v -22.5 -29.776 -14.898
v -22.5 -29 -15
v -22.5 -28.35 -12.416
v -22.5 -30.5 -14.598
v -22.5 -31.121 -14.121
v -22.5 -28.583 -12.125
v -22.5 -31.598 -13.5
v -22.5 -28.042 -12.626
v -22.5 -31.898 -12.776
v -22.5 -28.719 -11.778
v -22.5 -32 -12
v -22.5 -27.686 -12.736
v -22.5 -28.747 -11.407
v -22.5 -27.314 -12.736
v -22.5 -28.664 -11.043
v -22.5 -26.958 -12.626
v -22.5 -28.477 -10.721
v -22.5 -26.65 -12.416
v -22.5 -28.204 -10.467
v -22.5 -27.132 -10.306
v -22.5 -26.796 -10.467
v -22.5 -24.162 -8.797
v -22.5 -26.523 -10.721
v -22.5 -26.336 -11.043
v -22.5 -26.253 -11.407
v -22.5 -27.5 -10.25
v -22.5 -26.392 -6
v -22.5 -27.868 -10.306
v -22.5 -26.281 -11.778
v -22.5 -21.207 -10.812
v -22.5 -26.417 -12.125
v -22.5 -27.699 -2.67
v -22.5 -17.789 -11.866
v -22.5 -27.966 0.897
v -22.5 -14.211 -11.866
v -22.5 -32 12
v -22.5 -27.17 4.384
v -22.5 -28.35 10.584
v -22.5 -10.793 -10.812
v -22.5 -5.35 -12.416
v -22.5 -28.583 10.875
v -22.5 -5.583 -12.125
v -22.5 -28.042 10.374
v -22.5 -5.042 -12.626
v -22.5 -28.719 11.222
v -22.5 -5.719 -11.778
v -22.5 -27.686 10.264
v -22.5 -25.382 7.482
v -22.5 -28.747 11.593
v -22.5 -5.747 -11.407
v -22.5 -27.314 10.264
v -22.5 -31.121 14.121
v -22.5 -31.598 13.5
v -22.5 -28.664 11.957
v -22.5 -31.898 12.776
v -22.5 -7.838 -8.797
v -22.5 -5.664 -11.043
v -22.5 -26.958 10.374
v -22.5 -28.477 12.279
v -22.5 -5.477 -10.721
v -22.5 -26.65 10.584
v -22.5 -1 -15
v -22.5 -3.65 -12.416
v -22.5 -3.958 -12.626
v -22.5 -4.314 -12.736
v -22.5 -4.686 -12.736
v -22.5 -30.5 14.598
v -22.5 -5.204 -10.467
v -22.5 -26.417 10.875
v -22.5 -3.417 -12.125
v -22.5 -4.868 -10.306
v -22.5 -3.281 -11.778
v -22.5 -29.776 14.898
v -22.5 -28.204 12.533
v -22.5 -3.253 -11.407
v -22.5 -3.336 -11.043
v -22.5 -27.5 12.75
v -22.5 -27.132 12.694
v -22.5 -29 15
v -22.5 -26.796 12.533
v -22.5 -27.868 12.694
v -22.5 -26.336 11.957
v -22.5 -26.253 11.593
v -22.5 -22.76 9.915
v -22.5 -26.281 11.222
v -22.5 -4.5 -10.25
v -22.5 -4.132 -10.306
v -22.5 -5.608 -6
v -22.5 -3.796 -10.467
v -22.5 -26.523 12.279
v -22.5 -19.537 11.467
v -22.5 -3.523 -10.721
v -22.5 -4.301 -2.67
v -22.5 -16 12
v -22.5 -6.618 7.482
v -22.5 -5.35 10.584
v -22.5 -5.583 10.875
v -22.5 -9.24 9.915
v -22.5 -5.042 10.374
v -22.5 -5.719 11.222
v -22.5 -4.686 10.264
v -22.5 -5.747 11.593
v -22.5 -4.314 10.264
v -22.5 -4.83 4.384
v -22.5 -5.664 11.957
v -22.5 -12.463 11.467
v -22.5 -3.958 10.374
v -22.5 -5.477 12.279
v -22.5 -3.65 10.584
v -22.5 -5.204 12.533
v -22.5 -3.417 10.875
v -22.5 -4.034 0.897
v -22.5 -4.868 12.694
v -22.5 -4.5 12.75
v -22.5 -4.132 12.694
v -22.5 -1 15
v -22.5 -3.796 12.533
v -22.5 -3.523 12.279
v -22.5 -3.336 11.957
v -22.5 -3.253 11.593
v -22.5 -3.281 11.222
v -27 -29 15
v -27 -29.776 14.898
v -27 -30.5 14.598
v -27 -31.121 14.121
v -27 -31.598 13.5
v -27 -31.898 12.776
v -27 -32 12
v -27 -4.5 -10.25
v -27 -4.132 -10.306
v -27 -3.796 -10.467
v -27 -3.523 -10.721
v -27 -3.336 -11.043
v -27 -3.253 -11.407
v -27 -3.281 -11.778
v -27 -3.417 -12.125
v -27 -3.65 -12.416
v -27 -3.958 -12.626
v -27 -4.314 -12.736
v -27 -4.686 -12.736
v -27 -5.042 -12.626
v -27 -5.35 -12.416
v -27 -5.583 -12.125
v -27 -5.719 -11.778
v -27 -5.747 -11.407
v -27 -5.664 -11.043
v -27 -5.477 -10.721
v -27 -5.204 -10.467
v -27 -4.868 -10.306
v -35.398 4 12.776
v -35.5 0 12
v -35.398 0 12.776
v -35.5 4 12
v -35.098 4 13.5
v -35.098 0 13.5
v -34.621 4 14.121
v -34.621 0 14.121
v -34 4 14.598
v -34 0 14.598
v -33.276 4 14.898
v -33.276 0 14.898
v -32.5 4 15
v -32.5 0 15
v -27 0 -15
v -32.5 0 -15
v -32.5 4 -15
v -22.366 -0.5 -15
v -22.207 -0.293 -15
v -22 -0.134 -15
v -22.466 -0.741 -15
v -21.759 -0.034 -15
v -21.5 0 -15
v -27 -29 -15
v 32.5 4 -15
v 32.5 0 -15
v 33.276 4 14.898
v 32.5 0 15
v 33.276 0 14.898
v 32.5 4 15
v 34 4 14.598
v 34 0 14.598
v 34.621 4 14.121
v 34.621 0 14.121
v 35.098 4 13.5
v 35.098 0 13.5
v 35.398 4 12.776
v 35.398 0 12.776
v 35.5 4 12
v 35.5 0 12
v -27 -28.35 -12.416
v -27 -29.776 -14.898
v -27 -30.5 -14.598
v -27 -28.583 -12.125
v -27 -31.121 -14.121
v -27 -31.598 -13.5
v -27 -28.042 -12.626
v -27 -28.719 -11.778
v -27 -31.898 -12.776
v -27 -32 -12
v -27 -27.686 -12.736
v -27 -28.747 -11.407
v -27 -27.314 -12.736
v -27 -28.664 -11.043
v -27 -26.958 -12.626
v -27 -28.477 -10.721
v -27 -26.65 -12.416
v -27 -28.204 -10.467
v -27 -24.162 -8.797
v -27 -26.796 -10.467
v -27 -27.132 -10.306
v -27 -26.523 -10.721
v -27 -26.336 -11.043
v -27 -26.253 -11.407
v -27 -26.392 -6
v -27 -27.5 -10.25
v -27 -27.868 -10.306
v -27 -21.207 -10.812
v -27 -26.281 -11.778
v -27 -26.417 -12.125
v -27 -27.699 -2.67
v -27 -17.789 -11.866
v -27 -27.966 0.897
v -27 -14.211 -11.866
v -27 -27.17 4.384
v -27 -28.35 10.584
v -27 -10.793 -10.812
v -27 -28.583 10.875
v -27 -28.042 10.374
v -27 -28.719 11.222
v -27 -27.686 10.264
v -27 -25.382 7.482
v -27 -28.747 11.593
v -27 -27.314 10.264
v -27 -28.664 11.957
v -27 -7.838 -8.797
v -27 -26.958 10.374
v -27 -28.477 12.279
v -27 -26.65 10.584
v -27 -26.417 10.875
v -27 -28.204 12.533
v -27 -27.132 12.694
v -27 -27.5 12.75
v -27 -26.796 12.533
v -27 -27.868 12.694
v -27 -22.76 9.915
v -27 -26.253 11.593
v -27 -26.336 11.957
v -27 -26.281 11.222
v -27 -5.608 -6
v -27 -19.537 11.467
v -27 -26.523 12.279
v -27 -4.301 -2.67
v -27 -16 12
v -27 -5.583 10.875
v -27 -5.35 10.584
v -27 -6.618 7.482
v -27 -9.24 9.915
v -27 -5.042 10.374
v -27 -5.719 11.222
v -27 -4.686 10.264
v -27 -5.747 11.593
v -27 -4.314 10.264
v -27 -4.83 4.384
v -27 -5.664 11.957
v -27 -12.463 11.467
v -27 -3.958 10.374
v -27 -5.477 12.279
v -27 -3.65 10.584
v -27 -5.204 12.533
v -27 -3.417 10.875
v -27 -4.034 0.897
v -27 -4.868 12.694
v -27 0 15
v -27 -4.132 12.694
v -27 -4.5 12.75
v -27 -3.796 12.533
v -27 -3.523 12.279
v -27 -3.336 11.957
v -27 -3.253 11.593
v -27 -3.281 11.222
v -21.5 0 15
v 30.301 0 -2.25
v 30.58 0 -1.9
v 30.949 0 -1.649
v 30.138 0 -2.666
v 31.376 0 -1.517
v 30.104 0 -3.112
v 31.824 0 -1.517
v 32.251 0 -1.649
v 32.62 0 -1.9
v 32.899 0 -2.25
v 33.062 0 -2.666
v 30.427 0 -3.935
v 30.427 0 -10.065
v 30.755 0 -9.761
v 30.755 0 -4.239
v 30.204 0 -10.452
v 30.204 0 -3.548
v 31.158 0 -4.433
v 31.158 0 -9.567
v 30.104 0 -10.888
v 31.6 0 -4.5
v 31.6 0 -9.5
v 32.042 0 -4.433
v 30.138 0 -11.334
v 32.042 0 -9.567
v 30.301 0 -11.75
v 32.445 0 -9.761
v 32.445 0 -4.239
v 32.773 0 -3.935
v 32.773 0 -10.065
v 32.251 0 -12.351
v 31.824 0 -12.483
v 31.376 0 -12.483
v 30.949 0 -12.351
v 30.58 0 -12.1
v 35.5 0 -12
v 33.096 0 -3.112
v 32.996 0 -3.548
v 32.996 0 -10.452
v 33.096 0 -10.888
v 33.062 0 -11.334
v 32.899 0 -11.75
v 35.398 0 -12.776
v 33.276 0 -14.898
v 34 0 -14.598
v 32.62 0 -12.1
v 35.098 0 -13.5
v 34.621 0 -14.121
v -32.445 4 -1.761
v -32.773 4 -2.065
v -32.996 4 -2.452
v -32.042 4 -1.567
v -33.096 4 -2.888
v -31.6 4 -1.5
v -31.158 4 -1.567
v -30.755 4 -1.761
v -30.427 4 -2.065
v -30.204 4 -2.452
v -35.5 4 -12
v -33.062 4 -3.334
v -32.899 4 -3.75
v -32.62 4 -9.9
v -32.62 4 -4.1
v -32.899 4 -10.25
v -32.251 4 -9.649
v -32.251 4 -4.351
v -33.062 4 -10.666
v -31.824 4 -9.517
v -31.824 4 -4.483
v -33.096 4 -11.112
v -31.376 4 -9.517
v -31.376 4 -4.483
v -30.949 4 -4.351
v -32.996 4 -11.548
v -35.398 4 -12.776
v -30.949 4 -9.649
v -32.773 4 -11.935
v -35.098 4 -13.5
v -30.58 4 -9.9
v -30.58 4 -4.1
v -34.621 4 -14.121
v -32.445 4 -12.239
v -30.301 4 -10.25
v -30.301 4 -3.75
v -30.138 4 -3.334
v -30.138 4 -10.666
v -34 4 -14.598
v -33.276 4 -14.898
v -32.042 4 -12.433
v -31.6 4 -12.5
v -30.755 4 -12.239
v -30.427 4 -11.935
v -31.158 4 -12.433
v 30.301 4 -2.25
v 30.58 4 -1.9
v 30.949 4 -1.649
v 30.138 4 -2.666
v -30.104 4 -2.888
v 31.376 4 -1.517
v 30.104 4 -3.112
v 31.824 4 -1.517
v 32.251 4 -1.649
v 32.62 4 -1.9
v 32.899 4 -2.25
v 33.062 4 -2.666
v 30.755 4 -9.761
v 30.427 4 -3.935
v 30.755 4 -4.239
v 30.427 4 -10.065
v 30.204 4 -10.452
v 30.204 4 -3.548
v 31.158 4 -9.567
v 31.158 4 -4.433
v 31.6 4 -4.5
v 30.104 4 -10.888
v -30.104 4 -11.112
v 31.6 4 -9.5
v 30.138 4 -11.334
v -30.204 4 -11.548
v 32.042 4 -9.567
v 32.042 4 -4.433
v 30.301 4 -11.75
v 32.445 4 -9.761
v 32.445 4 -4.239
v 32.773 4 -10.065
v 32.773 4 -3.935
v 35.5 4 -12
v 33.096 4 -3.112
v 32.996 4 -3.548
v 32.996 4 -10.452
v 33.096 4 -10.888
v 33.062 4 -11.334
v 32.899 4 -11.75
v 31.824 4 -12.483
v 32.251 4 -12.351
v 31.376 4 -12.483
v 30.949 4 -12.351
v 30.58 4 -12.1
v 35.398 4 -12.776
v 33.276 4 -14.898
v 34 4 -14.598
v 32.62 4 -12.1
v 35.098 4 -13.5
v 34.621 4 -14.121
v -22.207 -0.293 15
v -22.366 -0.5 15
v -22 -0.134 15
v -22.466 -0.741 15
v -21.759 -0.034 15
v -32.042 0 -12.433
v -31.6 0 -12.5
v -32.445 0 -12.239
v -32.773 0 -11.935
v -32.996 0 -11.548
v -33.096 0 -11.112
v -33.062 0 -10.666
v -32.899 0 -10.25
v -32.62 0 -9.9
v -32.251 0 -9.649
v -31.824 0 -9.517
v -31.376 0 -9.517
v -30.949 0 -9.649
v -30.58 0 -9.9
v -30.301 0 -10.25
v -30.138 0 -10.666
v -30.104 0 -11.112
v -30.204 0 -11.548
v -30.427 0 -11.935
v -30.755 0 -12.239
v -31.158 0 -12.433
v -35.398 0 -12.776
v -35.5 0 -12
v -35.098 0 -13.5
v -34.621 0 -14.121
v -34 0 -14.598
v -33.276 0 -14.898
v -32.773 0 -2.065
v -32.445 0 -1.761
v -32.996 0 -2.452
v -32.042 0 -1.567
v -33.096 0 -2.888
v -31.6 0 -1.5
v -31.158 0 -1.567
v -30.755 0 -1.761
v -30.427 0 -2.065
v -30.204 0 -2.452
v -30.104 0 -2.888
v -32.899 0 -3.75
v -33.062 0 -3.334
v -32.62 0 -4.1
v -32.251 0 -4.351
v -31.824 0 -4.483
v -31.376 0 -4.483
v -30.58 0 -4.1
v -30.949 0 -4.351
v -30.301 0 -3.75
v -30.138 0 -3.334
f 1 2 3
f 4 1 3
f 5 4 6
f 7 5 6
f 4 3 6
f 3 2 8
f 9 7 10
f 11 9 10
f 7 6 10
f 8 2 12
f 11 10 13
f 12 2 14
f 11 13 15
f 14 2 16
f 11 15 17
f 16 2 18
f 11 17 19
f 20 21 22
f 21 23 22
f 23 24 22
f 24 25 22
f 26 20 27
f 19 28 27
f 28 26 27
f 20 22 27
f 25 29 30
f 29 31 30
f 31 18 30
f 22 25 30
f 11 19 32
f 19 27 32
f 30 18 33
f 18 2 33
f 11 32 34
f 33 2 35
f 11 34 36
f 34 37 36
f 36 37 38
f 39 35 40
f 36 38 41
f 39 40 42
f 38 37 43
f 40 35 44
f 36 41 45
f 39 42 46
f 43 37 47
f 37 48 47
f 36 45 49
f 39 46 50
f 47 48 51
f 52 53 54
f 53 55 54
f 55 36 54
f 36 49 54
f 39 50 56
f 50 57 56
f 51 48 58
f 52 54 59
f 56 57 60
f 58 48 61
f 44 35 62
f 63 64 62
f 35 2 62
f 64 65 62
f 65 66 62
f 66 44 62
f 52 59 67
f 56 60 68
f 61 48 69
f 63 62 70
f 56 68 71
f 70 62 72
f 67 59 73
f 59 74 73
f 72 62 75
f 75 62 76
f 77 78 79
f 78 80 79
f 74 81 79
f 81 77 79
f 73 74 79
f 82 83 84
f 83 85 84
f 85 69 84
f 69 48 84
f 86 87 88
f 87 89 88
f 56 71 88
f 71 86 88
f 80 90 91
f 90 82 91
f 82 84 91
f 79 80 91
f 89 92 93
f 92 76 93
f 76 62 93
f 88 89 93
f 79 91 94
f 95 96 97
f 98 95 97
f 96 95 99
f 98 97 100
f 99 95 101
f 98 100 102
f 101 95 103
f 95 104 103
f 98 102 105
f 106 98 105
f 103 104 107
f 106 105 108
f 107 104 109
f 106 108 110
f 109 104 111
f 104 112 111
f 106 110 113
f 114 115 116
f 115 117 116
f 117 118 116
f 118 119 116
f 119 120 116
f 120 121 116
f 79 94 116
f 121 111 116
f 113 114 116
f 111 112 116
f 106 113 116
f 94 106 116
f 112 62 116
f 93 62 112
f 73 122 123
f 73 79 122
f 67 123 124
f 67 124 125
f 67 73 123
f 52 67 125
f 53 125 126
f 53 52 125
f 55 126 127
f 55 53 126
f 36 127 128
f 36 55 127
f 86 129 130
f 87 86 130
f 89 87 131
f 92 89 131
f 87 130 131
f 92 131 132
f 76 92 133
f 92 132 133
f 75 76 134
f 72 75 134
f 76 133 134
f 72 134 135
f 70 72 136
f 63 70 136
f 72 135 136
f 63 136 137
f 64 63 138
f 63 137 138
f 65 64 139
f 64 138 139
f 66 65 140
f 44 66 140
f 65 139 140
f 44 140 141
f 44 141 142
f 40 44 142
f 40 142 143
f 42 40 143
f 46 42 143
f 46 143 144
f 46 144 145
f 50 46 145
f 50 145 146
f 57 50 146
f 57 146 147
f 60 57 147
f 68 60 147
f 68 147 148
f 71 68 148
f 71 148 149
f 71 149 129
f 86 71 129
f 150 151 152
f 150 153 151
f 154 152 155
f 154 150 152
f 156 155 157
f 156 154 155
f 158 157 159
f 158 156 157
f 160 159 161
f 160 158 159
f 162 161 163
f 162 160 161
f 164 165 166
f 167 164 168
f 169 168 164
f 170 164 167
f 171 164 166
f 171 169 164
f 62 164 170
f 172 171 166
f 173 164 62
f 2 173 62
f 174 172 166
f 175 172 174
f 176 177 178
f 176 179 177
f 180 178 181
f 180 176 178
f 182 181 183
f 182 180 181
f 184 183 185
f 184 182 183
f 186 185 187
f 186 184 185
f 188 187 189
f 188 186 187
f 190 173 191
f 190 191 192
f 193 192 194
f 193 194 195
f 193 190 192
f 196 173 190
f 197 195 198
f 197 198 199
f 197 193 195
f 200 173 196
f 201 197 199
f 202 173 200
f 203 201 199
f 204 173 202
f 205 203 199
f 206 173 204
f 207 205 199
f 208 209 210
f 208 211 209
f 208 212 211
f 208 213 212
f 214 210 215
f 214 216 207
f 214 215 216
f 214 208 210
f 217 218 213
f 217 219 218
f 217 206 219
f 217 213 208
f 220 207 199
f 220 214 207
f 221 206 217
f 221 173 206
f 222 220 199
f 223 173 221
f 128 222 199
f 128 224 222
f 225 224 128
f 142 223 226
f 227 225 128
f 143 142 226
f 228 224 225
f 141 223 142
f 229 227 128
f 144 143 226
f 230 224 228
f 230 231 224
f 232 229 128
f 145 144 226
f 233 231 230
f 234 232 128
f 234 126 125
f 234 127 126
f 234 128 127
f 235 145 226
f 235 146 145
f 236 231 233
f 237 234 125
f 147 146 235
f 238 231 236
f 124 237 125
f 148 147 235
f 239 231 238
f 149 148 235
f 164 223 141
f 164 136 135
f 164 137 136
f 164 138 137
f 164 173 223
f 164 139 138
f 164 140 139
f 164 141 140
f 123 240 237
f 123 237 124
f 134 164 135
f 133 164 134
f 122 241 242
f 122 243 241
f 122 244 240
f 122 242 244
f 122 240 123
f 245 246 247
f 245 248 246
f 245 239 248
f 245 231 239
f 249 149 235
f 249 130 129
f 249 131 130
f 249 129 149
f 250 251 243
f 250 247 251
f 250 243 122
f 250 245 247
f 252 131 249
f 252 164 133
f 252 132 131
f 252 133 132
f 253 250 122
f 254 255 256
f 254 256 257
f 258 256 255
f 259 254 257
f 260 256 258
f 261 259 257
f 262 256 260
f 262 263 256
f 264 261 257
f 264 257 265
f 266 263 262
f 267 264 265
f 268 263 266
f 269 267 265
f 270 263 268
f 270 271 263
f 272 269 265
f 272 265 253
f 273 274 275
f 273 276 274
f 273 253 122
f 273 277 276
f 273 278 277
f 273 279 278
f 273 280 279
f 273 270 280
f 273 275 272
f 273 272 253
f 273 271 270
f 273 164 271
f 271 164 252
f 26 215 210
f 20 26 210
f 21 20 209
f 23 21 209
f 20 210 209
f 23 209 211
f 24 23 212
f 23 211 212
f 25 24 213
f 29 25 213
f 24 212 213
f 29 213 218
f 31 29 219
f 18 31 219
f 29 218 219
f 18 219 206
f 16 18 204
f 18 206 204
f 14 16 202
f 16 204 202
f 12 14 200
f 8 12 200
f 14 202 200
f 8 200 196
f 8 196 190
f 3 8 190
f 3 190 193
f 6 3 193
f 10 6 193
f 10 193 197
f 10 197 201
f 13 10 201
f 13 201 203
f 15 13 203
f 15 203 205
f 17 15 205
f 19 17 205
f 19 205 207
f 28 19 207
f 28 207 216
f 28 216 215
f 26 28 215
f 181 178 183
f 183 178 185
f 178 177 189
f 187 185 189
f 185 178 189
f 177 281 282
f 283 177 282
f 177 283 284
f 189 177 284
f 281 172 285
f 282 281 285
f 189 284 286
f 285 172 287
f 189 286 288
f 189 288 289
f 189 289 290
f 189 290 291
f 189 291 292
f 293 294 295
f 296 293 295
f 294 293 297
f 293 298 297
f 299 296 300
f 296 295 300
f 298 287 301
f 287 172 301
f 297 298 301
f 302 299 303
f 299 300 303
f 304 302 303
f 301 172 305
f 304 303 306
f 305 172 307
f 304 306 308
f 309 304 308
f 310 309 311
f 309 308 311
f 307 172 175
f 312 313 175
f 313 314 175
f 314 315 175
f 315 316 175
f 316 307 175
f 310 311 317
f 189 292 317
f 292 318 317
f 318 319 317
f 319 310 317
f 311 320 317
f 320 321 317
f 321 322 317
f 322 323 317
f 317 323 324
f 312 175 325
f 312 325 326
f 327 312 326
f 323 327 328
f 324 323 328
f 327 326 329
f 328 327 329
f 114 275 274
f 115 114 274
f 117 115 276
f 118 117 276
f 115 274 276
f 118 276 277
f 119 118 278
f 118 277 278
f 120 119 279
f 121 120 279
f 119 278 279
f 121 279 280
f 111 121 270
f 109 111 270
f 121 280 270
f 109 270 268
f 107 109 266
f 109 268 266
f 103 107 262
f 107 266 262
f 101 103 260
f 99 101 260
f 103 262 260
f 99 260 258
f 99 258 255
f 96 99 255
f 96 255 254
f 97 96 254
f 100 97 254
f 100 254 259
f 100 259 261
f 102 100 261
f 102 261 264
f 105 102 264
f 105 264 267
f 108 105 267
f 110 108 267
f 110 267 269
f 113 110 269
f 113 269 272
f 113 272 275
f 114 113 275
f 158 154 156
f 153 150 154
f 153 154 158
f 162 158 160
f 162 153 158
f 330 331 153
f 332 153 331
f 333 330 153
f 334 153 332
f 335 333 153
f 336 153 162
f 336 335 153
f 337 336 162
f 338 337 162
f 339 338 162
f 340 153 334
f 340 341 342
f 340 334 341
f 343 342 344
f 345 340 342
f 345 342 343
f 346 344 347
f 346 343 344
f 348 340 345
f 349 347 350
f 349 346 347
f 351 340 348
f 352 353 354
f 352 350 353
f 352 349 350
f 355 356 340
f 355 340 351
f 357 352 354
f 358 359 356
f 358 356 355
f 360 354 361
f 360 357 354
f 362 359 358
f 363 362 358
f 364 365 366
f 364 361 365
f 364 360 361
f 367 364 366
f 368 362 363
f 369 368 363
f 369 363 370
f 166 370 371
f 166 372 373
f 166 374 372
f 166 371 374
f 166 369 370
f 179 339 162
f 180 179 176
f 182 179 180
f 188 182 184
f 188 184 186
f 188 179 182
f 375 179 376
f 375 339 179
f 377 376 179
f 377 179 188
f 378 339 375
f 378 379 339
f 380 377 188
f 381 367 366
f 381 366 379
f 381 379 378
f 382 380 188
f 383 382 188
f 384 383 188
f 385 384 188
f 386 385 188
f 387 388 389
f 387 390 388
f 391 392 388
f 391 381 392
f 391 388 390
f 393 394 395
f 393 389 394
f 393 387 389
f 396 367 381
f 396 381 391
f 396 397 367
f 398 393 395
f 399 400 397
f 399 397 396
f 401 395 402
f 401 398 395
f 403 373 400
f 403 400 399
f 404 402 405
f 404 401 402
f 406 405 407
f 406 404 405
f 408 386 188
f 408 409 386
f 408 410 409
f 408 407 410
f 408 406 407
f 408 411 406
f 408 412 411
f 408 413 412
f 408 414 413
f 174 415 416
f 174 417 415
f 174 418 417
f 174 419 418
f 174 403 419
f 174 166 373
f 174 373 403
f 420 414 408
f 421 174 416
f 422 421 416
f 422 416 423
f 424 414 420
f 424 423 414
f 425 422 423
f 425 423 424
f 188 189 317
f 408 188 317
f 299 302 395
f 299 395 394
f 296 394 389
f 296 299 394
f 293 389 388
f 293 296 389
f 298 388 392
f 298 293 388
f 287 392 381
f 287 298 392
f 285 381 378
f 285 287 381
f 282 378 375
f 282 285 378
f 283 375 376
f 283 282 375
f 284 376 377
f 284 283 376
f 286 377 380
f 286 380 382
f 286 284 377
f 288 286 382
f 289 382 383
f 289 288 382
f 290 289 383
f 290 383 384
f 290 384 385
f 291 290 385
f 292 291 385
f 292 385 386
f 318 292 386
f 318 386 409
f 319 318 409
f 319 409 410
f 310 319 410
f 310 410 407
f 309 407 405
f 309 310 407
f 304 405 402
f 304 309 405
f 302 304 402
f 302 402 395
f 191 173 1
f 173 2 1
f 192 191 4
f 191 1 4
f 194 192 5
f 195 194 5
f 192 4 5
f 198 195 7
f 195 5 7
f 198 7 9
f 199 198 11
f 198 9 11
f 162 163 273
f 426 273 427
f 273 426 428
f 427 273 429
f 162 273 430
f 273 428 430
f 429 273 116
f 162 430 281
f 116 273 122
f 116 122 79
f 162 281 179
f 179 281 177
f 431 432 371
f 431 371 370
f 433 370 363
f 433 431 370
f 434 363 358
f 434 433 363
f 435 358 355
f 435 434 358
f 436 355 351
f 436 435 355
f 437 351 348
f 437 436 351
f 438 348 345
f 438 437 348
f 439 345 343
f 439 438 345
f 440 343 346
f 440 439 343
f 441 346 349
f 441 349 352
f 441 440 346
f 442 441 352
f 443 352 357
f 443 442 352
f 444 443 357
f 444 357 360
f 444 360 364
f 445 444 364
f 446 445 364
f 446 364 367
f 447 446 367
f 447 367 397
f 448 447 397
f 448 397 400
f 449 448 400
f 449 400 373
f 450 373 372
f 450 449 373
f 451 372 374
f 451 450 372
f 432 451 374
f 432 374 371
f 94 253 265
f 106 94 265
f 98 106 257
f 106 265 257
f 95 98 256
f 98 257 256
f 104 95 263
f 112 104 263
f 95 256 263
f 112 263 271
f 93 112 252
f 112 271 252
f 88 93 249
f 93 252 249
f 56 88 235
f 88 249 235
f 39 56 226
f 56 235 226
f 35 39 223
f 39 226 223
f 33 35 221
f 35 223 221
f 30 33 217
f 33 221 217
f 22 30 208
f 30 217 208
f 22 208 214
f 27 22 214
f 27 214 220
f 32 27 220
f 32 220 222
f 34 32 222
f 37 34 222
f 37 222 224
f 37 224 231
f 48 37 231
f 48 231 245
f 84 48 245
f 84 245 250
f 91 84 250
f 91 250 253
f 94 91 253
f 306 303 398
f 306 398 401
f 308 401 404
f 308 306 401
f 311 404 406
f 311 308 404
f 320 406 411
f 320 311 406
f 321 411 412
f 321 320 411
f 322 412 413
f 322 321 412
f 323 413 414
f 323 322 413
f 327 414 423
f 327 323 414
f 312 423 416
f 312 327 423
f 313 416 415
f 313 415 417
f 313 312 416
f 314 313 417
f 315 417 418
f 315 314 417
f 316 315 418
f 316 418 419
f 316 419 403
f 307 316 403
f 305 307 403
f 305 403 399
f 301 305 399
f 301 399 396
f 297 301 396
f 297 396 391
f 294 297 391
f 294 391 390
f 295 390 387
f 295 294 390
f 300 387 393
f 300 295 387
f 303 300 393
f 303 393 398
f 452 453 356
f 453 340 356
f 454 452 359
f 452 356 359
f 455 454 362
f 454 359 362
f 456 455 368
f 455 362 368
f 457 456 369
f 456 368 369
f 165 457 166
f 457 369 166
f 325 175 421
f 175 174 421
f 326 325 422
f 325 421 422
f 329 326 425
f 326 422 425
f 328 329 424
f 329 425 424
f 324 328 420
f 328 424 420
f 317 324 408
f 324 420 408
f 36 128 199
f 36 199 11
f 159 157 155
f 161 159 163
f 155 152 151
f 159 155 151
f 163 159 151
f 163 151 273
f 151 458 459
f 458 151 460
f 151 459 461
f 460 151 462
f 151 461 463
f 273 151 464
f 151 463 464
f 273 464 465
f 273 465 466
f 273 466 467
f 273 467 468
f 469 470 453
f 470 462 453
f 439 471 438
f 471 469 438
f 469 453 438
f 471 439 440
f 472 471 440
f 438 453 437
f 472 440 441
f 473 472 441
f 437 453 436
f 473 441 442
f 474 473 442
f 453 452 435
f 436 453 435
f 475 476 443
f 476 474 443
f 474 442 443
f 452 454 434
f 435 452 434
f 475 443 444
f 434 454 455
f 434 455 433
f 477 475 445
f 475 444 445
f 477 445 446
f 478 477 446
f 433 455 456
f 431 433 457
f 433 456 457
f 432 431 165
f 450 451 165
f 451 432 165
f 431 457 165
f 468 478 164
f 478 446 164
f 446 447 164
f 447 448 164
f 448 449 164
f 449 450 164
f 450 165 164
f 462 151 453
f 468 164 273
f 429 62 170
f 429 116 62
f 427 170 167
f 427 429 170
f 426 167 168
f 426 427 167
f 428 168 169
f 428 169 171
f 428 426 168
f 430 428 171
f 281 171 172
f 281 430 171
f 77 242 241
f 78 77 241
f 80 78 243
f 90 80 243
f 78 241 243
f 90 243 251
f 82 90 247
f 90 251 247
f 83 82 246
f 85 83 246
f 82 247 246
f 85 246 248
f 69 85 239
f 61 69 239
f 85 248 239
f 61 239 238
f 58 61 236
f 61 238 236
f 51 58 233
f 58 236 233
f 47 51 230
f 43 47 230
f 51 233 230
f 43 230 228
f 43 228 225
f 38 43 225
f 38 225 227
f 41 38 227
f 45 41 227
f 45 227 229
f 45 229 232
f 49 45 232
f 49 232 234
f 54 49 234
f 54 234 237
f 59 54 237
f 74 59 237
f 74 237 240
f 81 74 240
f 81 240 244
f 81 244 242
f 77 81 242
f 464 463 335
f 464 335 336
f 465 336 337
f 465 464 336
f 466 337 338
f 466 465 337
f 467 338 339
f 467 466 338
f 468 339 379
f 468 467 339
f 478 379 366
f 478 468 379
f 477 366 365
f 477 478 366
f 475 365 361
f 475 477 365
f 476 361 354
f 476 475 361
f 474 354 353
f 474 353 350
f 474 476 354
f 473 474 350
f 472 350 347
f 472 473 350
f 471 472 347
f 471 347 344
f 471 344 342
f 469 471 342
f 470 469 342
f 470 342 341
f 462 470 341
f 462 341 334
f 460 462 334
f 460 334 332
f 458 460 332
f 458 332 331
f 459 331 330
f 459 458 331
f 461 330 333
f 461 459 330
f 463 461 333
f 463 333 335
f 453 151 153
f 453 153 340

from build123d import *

# Parameters (mm, degrees)
SKETCH_1_W          = 71
SKETCH_1_H          = 30
SKETCH_1_R          = 1.5
EXTRUDE_1_DEPTH     = 4
FILLET_1_R          = 3
SKETCH_3_W          = 4.5
SKETCH_3_H          = 30
EXTRUDE_3_DEPTH     = 32
SKETCH_4_R          = 1.25
SKETCH_4_R_2        = 12
CUT_EXTRUDE_1_DEPTH = 30
FILLET_2_R          = 3
FILLET_3_R          = 1


with BuildPart() as part:
    # 草图1 → 凸台-拉伸1 (new body)
    with BuildSketch(Plane(origin=(0, 0, 0), x_dir=(1, 0, 0), z_dir=(0, 1, 0))):
        Rectangle(SKETCH_1_W, SKETCH_1_H)
        with Locations(Location((31.6, 11, 0), (0, 0, 270))):
            Circle(SKETCH_1_R, mode=Mode.SUBTRACT)
        with Locations(Location((31.6, 3, 0), (0, 0, 90))):
            Circle(SKETCH_1_R, mode=Mode.SUBTRACT)
        with Locations(Location((-31.6, 3, 0), (0, 0, 270))):
            Circle(SKETCH_1_R, mode=Mode.SUBTRACT)
        with Locations(Location((-31.6, 11, 0), (0, 0, 90))):
            Circle(SKETCH_1_R, mode=Mode.SUBTRACT)
    extrude(amount=EXTRUDE_1_DEPTH)

    # 圆角1
    fillet_1_edges = [part.edges().sort_by_distance(p)[0] for p in [
        (35.5, 2, 15),
        (-35.5, 2, 15),
        (-35.5, 2, -15),
        (35.5, 2, -15),
    ]]
    fillet(fillet_1_edges, radius=FILLET_1_R)

    # 草图3 → 凸台-拉伸3 (add)
    with BuildSketch(Plane.XZ):
        with Locations((-24.75, 0)):
            Rectangle(SKETCH_3_W, SKETCH_3_H)
    extrude(amount=EXTRUDE_3_DEPTH)

    # 草图4 → 切除-拉伸1 (cut)
    with BuildSketch(Plane.ZY.offset(27)):
        with Locations((11.5, -4.5)):
            Circle(SKETCH_4_R)
        with Locations((11.5, -27.5)):
            Circle(SKETCH_4_R)
        with Locations((-11.5, -27.5)):
            Circle(SKETCH_4_R)
        with Locations((-11.5, -4.5)):
            Circle(SKETCH_4_R)
        with Locations((0, -16)):
            Circle(SKETCH_4_R_2)
    extrude(amount=-CUT_EXTRUDE_1_DEPTH, mode=Mode.SUBTRACT)

    # 圆角2
    fillet_2_edges = [part.edges().sort_by_distance(p)[0] for p in [
        (-24.75, -32, -15),
        (-24.75, -32, 15),
    ]]
    fillet(fillet_2_edges, radius=FILLET_2_R)

    # 圆角3
    fillet_3_edges = [part.edges().sort_by_distance(p)[0] for p in [
        (-22.5, 0, 0),
    ]]
    fillet(fillet_3_edges, radius=FILLET_3_R)


solid = part.part
